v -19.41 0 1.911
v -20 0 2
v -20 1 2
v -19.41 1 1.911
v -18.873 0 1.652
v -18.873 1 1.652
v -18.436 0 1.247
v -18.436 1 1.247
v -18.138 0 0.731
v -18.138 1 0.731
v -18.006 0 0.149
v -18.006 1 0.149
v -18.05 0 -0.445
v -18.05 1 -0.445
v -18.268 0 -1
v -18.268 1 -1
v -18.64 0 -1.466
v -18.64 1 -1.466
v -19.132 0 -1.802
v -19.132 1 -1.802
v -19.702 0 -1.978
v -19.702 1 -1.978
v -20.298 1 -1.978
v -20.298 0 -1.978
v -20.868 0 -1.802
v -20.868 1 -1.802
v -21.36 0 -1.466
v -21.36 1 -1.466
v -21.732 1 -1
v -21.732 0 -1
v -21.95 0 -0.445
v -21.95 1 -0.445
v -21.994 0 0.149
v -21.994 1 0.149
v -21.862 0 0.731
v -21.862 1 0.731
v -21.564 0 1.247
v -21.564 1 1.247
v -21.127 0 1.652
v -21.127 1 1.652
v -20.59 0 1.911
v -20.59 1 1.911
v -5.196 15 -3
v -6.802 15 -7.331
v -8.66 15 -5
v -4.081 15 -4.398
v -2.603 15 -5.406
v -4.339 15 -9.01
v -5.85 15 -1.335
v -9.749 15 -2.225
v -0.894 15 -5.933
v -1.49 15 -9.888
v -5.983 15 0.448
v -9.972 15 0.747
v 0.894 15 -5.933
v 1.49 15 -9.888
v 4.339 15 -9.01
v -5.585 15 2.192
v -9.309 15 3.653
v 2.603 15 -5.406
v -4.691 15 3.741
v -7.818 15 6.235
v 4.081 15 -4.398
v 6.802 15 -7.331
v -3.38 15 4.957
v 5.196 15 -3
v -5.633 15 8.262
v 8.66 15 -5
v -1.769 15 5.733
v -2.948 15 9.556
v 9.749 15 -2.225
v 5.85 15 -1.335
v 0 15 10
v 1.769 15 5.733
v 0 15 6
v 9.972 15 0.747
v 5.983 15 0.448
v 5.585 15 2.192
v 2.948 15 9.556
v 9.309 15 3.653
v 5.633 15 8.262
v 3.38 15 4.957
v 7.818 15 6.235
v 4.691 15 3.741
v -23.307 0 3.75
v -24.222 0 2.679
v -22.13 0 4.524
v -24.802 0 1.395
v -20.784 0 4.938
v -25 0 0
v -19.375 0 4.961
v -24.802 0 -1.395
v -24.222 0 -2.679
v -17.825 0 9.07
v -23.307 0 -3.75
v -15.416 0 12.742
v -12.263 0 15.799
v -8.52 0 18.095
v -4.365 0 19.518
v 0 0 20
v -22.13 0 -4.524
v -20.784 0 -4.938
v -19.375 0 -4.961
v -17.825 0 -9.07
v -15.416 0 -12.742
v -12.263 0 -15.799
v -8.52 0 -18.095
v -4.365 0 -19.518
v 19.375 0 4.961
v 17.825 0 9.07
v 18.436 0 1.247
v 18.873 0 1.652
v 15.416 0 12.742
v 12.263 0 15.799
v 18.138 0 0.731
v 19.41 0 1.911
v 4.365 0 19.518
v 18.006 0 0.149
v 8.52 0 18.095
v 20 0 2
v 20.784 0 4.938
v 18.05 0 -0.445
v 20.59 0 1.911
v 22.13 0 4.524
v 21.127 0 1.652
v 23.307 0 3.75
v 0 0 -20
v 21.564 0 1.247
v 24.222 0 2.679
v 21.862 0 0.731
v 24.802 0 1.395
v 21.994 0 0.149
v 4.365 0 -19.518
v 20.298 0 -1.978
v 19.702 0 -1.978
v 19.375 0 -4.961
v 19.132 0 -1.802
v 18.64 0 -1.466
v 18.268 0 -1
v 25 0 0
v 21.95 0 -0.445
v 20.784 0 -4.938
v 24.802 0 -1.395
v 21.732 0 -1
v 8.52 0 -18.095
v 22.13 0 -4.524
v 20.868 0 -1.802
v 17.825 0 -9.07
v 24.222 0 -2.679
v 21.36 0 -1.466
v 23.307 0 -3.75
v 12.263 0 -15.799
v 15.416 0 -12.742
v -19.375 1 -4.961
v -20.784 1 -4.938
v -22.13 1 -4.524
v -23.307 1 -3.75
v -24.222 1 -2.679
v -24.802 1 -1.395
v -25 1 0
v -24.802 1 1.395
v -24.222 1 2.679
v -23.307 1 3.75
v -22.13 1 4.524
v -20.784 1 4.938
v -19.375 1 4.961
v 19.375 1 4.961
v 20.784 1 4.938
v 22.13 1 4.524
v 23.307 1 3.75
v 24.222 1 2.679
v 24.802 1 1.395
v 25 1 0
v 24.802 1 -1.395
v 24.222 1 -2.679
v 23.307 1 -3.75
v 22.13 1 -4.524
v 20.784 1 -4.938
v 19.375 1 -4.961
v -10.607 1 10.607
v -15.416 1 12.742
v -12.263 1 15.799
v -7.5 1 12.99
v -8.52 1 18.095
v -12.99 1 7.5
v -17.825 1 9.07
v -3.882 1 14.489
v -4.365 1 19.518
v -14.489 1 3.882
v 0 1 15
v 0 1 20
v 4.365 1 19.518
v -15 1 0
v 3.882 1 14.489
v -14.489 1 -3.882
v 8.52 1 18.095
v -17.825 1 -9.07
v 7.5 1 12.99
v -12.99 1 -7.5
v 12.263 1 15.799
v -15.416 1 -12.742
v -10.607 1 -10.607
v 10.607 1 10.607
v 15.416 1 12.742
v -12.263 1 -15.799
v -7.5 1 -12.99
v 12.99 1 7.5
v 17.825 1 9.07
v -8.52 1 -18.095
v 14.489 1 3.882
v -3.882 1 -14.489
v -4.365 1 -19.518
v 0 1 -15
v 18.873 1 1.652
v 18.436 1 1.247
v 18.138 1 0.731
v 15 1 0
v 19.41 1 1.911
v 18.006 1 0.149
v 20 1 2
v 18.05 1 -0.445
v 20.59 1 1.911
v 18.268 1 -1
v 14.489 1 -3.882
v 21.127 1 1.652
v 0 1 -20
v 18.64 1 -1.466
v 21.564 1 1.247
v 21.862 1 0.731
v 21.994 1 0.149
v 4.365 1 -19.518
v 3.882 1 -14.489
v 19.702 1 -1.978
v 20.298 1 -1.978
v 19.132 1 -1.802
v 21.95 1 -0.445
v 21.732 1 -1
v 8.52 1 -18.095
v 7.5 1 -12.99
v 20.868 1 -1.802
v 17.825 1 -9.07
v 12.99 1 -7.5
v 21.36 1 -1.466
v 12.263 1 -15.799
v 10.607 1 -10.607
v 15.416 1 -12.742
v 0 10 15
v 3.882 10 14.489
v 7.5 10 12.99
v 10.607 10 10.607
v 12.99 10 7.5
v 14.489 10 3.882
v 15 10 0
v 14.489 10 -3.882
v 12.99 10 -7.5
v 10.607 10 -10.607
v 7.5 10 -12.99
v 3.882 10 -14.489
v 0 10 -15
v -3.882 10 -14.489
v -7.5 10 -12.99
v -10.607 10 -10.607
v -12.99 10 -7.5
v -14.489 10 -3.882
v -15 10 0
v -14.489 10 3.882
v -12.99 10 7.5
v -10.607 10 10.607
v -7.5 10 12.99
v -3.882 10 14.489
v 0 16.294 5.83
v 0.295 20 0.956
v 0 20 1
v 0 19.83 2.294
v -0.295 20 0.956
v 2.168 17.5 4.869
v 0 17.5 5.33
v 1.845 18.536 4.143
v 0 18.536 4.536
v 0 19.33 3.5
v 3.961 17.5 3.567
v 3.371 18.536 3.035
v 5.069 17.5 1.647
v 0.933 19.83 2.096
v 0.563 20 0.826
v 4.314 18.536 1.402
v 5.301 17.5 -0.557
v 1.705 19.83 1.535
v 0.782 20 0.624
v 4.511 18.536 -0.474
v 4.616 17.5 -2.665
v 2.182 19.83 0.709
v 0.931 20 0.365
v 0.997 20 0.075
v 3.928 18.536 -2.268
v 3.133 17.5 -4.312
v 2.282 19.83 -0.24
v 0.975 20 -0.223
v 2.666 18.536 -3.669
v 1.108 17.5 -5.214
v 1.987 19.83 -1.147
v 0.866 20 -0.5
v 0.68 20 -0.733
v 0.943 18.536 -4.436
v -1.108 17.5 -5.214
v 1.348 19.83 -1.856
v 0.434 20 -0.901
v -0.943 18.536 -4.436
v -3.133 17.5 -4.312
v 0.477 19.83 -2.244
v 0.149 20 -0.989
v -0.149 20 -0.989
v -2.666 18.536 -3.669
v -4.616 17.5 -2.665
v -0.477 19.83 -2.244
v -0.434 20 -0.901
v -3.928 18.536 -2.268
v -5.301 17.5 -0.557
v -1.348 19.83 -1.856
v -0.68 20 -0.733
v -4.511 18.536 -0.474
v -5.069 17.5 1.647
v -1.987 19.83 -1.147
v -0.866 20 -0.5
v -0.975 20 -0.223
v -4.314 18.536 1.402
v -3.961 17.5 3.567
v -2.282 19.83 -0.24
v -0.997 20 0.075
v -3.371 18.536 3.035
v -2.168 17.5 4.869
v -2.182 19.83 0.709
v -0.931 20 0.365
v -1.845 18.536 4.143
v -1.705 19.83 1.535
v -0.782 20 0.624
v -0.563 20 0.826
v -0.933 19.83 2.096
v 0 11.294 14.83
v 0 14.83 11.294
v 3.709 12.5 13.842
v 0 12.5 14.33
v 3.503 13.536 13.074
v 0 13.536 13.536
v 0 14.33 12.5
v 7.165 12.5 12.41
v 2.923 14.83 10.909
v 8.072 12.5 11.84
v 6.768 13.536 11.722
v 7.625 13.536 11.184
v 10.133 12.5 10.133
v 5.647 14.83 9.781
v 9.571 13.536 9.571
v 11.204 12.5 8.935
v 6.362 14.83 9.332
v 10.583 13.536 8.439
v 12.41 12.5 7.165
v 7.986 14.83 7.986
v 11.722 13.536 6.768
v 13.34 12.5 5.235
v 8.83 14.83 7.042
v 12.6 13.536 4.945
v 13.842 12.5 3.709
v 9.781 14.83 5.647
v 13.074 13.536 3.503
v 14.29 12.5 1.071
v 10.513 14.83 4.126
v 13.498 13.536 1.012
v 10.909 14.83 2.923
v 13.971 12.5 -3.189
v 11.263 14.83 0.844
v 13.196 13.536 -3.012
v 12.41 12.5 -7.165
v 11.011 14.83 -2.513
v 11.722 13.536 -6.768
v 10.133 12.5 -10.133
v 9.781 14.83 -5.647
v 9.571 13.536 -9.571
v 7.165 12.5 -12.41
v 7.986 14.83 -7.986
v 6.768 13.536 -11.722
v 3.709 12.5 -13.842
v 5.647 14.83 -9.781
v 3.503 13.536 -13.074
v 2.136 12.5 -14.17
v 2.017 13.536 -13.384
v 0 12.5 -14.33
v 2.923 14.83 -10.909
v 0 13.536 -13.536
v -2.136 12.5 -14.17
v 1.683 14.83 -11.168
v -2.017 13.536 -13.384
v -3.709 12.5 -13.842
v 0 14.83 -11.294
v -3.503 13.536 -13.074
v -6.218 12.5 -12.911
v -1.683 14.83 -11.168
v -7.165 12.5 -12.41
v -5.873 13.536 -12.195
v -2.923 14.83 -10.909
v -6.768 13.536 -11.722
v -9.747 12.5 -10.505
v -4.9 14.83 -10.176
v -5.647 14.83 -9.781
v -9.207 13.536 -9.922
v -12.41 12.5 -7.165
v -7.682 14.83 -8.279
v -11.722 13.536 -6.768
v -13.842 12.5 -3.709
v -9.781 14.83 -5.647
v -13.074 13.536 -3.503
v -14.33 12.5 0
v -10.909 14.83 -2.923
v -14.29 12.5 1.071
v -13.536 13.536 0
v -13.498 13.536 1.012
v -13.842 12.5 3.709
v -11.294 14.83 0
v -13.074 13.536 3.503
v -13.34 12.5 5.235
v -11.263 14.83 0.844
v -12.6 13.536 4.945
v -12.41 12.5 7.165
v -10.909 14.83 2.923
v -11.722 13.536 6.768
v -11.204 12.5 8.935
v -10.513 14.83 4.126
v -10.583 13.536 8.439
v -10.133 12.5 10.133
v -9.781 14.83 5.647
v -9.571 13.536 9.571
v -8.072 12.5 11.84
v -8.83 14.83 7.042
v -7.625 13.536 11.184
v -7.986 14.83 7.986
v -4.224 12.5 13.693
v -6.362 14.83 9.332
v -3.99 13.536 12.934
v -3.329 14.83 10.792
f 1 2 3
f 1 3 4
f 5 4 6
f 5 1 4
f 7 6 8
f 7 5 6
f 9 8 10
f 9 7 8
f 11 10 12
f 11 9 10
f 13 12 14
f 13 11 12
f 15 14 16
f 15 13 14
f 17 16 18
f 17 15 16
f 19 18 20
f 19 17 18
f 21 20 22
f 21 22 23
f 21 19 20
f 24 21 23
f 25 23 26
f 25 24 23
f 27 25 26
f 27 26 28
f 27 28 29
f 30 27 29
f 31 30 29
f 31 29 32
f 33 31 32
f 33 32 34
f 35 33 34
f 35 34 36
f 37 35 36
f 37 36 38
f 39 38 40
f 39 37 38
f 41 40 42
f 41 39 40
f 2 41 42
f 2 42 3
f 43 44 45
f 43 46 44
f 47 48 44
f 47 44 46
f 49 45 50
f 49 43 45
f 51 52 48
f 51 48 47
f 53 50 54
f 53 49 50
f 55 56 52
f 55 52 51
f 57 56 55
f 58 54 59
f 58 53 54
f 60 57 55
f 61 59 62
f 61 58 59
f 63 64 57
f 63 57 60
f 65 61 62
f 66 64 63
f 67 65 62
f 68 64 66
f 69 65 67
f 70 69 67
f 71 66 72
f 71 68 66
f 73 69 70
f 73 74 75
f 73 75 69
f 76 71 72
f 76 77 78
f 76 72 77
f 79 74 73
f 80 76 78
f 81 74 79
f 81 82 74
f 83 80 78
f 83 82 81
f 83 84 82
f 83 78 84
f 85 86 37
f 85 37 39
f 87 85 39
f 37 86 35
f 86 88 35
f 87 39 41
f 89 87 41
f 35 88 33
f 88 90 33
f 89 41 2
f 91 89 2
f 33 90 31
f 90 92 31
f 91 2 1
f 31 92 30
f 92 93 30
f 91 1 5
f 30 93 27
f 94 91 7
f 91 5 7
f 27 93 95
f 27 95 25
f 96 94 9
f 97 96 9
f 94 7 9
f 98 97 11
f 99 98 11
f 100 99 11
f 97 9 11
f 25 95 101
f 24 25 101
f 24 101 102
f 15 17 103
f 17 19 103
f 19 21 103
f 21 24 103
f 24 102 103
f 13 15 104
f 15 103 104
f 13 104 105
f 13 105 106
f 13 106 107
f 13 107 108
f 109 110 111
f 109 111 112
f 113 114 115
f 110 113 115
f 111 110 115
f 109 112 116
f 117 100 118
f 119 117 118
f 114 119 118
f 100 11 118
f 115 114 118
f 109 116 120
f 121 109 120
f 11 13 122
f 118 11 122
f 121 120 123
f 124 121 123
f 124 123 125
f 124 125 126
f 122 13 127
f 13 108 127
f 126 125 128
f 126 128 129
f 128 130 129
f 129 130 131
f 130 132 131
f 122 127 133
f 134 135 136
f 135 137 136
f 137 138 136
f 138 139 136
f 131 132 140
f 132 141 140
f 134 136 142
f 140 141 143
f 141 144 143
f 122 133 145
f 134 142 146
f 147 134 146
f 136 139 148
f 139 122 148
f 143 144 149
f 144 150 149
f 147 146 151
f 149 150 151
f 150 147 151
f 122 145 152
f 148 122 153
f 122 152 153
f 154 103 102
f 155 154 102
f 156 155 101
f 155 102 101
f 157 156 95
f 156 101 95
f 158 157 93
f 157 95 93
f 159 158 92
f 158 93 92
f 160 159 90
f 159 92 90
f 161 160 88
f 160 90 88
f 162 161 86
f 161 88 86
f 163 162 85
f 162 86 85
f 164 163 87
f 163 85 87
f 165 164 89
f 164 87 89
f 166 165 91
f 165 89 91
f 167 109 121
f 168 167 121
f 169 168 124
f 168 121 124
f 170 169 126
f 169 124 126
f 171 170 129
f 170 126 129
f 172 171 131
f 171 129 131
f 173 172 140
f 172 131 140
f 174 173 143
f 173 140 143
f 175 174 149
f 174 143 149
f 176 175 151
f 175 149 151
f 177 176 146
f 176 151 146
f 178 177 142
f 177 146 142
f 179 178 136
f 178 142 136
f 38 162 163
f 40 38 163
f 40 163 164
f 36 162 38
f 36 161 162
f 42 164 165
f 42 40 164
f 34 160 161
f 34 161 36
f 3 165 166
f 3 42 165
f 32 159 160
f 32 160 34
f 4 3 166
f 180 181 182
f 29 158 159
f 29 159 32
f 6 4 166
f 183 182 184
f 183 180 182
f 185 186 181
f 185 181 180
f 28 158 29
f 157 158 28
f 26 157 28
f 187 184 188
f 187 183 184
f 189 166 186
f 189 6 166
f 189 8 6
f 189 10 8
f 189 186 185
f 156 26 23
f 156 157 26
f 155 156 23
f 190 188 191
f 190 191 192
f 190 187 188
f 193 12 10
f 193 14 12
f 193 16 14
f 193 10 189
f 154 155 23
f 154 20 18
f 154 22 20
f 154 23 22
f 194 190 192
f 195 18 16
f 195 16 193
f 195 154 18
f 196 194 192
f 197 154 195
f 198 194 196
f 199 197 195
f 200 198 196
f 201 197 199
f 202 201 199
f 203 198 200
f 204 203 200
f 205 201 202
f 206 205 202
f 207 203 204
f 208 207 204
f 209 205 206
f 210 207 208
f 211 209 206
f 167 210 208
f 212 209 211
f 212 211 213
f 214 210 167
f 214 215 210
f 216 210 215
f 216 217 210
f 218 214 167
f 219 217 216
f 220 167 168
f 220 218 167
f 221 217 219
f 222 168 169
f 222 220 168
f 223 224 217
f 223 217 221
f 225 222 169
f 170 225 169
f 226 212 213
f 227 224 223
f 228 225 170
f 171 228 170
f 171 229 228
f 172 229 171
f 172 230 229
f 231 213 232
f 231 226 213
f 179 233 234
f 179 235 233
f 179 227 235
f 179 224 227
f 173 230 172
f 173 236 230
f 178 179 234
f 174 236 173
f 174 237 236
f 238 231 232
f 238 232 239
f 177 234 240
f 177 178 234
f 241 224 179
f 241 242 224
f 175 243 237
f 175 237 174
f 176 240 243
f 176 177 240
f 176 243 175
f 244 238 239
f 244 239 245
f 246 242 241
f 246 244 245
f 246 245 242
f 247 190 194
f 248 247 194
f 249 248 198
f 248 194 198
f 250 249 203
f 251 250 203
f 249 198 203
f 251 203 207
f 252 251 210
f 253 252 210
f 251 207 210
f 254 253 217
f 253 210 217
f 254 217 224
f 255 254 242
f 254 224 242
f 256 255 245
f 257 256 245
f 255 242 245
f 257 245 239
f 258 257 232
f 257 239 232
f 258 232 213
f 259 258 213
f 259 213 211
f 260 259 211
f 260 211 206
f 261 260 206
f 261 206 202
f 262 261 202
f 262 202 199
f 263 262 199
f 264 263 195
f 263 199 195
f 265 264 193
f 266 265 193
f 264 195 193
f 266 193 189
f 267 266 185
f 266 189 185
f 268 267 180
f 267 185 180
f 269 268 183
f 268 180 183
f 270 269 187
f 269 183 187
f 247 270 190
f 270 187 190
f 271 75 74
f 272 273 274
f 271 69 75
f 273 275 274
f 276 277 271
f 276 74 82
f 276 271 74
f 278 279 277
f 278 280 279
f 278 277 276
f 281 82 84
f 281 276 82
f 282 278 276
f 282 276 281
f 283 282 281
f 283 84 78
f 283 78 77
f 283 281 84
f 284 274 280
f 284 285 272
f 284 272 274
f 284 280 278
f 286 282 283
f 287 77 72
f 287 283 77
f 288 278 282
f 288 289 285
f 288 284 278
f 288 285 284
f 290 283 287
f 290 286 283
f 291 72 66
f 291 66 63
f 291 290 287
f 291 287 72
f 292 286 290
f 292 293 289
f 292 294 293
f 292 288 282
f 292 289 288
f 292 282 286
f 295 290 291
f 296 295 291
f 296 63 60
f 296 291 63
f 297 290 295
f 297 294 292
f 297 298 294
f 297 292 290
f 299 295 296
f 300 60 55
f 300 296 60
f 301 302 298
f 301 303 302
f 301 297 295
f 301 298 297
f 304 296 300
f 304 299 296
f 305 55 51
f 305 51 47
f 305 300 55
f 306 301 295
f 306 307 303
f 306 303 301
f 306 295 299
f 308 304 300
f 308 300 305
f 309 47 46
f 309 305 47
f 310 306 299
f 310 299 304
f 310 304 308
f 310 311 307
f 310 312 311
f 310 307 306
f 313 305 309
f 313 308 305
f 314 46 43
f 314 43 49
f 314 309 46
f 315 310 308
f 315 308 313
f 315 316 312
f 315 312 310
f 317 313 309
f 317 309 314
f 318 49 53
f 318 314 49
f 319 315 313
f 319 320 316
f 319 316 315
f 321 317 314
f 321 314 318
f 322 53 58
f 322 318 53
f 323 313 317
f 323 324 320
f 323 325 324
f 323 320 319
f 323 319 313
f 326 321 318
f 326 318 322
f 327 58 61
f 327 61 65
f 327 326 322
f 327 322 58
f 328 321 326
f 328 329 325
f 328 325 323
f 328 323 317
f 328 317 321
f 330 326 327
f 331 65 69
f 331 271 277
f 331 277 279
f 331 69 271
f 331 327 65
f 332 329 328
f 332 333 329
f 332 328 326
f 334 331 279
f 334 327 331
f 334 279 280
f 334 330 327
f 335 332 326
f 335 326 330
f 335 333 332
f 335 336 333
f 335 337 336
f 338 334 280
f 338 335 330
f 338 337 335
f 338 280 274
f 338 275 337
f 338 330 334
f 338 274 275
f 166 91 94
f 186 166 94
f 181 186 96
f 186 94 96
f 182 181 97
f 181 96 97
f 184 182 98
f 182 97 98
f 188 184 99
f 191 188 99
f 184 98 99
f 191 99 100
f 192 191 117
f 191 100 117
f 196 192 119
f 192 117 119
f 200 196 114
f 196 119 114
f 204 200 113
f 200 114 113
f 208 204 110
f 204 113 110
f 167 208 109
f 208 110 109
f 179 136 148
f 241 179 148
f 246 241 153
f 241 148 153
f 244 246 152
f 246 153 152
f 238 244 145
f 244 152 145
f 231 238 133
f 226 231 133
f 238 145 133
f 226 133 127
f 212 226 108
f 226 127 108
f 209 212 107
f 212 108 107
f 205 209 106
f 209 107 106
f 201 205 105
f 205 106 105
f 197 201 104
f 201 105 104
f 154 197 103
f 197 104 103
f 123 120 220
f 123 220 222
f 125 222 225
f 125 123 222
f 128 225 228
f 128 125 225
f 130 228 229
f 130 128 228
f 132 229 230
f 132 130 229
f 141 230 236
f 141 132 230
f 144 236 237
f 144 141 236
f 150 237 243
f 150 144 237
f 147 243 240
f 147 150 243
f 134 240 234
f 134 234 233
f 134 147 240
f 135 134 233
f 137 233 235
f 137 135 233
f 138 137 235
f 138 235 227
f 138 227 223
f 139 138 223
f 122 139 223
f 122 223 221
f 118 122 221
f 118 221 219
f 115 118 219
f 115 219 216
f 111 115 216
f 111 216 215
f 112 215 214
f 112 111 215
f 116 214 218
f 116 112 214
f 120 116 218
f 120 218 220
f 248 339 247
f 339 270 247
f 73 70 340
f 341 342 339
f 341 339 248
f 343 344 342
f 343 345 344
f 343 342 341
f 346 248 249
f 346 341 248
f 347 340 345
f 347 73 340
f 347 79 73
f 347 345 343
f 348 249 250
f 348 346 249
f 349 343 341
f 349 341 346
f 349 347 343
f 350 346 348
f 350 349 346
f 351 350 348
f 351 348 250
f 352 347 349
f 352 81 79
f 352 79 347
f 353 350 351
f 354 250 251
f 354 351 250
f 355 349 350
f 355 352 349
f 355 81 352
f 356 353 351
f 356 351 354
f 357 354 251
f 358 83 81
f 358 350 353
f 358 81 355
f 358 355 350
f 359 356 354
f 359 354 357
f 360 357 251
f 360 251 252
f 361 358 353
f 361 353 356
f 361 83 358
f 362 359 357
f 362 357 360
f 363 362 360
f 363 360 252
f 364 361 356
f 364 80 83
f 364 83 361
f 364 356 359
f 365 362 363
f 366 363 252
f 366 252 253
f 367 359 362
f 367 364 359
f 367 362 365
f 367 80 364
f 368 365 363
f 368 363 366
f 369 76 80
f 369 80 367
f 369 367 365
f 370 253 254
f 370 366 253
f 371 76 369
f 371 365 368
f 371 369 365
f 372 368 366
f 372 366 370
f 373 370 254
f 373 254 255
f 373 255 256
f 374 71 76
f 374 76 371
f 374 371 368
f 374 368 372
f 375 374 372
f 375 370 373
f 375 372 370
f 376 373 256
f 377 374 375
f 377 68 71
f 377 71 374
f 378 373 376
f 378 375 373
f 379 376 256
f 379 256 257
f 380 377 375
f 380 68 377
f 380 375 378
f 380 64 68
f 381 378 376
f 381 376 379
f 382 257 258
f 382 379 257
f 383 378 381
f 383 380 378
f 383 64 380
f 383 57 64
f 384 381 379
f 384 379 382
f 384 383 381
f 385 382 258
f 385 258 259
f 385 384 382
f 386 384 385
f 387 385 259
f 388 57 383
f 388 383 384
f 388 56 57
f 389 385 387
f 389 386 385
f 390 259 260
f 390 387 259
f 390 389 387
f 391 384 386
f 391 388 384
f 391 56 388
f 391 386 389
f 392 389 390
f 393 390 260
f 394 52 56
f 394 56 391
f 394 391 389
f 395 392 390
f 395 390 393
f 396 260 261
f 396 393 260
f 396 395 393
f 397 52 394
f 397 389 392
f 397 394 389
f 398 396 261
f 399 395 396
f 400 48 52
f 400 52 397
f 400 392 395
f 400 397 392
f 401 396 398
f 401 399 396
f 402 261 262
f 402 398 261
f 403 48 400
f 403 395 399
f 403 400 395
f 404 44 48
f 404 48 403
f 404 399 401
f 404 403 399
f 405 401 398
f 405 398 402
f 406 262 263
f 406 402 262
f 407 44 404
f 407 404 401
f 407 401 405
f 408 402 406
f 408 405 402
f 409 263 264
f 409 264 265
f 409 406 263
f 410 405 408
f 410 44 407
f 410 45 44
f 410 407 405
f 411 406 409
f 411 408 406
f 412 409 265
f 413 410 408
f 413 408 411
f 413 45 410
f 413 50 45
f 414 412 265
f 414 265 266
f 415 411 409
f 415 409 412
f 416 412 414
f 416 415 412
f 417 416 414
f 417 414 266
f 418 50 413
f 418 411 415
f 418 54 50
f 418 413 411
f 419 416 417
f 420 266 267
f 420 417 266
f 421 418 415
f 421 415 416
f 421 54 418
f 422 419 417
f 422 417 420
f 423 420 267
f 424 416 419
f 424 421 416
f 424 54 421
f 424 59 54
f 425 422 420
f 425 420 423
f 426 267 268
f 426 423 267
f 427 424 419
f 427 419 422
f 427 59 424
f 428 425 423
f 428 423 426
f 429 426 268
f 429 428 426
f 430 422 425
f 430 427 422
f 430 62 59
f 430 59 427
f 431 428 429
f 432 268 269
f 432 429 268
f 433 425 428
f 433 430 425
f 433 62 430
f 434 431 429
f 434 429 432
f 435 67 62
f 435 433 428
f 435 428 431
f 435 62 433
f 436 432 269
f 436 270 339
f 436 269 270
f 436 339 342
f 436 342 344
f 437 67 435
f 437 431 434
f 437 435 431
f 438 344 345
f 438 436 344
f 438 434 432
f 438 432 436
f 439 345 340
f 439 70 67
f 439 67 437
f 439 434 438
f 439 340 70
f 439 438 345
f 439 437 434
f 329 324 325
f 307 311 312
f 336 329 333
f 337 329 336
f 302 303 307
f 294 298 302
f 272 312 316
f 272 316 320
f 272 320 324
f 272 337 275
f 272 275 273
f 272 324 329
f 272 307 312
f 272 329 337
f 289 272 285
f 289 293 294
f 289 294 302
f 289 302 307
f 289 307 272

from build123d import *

# Parameters (mm, degrees)
SKETCH1_R           = 2
BOSS_EXTRUDE1_DEPTH = 1
SKETCH2_R           = 15
BOSS_EXTRUDE2_DEPTH = 14
FILLET1_R           = 5
SKETCH3_R           = 6
BOSS_EXTRUDE3_DEPTH = 5
FILLET2_R           = 5


with BuildPart() as part:
    # Sketch1 → Boss-Extrude1 (new body)
    with BuildSketch(Plane(origin=(0, 0, 0), x_dir=(1, 0, 0), z_dir=(0, 1, 0))):
        with BuildLine():
            ThreePointArc((-19.375, -4.960783708), (0, -20), (19.375, -4.960783708))
            ThreePointArc((19.375, -4.960783708), (25, 0), (19.375, 4.960783708))
            ThreePointArc((19.375, 4.960783708), (0, 20), (-19.375, 4.960783708))
            ThreePointArc((-19.375, 4.960783708), (-25, 0), (-19.375, -4.960783708))
        make_face()
        with Locations(Location((-20, 0, 0), (0, 0, 270))):
            Circle(SKETCH1_R, mode=Mode.SUBTRACT)
        with Locations(Location((20, 0, 0), (0, 0, 270))):
            Circle(SKETCH1_R, mode=Mode.SUBTRACT)
    extrude(amount=BOSS_EXTRUDE1_DEPTH)

    # Sketch2 → Boss-Extrude2 (add)
    with BuildSketch(Plane(origin=(0, 1, 0), x_dir=(1, 0, 0), z_dir=(0, 1, 0))):
        with Locations(Location((0, 0, 0), (0, 0, 270))):
            Circle(SKETCH2_R)
    extrude(amount=BOSS_EXTRUDE2_DEPTH)

    # Fillet1
    fillet1_edges = [part.edges().sort_by_distance(p)[0] for p in [
        (0, 15, -15),
    ]]
    fillet(fillet1_edges, radius=FILLET1_R)

    # Sketch3 → Boss-Extrude3 (add)
    with BuildSketch(Plane(origin=(0, 15, 0), x_dir=(1, 0, 0), z_dir=(0, 1, 0))):
        with Locations(Location((0, 0, 0), (0, 0, 270))):
            Circle(SKETCH3_R)
    extrude(amount=BOSS_EXTRUDE3_DEPTH)

    # Fillet2
    fillet2_edges = [part.edges().sort_by_distance(p)[0] for p in [
        (0, 20, -6),
    ]]
    fillet(fillet2_edges, radius=FILLET2_R - 0.0001)  # a hair under: the kernel refuses the full size


solid = part.part
